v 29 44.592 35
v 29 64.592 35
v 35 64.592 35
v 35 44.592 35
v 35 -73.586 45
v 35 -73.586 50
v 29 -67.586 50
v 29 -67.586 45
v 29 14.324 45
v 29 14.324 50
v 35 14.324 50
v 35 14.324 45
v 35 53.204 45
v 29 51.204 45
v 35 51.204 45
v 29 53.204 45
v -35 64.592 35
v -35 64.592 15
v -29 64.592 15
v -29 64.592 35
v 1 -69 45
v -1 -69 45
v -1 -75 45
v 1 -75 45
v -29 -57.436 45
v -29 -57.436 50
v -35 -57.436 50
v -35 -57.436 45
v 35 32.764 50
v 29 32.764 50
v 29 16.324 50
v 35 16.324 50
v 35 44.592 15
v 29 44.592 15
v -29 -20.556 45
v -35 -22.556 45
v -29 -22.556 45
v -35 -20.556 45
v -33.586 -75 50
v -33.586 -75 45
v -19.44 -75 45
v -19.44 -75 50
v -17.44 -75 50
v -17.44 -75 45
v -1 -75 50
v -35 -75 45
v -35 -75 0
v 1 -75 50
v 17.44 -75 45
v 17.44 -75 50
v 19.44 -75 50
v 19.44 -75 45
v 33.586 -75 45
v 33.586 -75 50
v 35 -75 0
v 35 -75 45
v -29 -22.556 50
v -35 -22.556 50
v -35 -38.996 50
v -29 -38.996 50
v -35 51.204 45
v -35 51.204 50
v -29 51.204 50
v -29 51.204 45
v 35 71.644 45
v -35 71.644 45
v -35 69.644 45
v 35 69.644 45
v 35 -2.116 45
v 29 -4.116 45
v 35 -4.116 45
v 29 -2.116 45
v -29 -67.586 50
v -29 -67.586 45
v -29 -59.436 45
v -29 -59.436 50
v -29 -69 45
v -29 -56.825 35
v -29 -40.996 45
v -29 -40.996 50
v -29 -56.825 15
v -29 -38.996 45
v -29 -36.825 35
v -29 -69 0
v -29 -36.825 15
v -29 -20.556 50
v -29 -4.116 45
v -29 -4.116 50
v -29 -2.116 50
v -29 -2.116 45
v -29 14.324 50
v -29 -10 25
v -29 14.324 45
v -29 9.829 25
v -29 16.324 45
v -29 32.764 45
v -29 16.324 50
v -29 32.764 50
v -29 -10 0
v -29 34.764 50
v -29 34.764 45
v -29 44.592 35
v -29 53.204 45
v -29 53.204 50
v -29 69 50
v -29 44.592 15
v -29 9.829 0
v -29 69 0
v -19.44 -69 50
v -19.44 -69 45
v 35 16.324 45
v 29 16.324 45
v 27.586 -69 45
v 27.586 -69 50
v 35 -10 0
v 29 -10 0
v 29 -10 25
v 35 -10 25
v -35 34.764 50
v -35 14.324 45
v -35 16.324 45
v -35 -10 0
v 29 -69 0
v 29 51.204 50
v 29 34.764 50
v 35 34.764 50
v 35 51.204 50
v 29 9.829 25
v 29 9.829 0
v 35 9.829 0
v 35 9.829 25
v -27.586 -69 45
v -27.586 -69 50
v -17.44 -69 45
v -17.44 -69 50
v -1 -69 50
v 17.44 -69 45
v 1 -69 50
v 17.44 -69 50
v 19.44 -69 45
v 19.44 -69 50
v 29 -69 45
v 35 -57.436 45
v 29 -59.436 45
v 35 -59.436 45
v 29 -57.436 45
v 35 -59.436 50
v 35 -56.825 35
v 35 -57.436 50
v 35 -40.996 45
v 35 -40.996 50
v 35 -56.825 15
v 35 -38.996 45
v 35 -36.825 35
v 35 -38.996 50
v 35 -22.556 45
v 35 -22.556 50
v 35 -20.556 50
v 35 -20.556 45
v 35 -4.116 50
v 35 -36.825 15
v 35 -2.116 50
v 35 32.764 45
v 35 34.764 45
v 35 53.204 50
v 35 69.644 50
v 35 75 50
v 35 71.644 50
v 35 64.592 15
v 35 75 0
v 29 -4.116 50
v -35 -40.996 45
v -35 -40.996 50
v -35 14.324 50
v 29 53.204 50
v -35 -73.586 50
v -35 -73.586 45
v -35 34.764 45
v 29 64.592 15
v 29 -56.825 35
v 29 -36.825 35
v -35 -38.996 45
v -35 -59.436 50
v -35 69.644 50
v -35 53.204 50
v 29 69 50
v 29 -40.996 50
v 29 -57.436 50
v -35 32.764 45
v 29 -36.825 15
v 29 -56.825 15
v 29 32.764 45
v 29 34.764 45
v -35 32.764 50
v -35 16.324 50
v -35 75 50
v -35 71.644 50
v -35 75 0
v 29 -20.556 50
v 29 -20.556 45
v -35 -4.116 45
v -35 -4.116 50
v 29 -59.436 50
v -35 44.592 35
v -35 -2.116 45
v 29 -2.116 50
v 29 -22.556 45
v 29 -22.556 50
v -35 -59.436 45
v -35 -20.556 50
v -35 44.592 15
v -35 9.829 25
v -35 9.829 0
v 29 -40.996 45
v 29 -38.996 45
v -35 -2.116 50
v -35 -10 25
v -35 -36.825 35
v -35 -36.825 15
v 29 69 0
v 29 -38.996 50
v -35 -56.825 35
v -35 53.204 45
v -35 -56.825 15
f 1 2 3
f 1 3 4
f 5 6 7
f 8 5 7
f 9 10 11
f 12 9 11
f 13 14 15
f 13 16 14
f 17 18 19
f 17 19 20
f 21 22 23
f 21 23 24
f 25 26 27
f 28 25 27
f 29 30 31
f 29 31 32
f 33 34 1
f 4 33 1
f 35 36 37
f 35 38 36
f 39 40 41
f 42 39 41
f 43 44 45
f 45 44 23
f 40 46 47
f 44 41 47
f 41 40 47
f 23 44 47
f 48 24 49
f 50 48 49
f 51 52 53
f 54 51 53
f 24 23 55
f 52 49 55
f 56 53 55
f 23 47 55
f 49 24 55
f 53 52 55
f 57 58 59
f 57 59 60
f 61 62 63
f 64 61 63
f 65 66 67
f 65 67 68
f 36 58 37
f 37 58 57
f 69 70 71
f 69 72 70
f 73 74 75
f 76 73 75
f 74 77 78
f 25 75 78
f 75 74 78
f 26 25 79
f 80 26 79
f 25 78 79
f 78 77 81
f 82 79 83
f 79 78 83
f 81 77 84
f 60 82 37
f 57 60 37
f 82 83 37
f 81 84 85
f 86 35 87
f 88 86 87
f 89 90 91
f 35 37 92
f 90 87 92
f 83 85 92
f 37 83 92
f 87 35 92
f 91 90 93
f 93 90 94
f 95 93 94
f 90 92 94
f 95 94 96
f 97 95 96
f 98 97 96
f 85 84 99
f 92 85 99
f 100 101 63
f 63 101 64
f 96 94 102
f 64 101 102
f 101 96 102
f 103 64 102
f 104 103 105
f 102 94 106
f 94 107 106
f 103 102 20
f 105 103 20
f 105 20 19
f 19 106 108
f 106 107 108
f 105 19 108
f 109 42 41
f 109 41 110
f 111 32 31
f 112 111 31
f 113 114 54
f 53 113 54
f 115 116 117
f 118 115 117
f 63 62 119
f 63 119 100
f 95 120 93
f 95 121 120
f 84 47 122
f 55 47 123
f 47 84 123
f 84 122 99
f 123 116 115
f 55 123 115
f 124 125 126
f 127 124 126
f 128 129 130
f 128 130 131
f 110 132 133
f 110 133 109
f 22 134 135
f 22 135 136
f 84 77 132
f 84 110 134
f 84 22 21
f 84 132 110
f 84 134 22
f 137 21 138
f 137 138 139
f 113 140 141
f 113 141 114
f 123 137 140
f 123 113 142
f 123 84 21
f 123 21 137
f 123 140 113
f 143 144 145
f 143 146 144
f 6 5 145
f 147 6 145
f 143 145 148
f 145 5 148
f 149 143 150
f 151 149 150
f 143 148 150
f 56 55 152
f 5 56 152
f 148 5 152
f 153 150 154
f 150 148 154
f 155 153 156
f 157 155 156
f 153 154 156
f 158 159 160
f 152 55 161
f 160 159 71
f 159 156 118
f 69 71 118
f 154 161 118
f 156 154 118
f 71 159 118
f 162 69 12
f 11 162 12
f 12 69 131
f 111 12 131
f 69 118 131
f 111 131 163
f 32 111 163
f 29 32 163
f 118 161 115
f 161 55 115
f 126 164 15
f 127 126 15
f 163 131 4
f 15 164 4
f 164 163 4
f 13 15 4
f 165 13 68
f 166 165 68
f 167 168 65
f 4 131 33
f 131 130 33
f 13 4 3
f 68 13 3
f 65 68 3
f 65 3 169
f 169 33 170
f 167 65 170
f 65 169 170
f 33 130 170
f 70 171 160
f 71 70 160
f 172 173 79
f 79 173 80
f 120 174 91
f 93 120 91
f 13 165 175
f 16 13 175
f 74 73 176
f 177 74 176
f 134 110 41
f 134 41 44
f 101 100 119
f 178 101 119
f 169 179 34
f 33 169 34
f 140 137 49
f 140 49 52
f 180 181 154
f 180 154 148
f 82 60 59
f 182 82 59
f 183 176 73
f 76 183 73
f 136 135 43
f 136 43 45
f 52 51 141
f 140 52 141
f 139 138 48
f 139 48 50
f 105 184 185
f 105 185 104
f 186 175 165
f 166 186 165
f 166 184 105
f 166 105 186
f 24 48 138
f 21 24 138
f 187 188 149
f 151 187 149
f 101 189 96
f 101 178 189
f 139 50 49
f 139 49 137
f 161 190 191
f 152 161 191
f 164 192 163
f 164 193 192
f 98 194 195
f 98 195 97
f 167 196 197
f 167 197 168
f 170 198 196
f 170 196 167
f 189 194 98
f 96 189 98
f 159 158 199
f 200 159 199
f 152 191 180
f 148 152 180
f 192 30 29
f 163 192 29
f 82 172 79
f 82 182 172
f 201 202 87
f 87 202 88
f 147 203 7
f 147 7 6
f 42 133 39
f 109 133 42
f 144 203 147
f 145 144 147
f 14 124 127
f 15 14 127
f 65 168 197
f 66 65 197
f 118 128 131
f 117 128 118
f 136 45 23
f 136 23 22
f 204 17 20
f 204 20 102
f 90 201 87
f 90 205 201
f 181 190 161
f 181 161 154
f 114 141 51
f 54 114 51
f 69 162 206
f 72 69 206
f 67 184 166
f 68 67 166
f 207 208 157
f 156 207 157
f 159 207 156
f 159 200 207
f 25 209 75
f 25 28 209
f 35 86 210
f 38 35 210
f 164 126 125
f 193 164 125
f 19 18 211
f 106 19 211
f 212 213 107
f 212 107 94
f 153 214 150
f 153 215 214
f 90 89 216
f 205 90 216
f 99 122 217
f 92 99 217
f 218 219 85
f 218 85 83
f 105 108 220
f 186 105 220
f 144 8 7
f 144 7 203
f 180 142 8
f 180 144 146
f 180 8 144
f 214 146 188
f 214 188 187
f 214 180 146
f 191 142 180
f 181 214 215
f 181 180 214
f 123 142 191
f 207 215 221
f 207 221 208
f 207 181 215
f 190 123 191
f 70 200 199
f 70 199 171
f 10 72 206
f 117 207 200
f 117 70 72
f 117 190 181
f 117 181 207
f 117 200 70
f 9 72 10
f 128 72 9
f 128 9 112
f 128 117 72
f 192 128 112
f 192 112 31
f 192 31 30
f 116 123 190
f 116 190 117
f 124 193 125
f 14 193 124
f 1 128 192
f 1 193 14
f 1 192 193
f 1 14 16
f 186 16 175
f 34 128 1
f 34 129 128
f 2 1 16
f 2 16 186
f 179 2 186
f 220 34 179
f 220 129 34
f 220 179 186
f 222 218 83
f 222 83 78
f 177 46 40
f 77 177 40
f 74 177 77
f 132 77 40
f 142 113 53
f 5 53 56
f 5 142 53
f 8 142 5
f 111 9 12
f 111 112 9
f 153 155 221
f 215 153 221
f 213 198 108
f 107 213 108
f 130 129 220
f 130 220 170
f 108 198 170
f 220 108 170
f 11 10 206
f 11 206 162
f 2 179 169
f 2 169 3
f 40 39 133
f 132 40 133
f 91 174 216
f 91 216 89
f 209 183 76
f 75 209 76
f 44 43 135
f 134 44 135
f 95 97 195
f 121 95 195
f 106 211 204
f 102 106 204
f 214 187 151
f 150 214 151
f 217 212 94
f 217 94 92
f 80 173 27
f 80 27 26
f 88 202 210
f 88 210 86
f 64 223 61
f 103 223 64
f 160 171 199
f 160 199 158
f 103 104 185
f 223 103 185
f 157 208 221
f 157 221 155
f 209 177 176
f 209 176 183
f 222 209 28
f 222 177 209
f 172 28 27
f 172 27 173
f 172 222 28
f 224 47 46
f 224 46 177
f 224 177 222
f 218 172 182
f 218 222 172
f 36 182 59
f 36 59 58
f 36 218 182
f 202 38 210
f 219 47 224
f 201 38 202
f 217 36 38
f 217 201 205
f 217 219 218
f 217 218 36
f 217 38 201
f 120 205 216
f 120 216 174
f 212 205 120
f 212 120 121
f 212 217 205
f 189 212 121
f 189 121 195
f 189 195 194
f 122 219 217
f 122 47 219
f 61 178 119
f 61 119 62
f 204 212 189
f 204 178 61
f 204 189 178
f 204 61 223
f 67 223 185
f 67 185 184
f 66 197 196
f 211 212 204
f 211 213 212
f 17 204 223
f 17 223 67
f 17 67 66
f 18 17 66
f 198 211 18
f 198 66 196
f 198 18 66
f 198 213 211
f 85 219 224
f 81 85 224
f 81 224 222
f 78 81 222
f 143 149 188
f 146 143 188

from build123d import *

# Parameters (mm, degrees)
F0_W      = 70
F0_H      = 150
F0_W_2    = 58
F0_H_2    = 138
F1_DEPTH  = 50
F2_W      = 2
F2_H      = 6
F3_DEPTH  = 5
F4_W      = 2
F4_H      = 6
F5_DEPTH  = 5
F7_DEPTH  = 5
F8_W      = 20
F8_H      = 20
F8_W_2    = 19.828947
F8_H_2    = 25
F9_DEPTH  = 200
F10_DEPTH = 25


with BuildPart() as f1:
    # F0 (on Top) → F1 (new body)
    with BuildSketch(Plane.XY):
        Rectangle(F0_W, F0_H)
        Rectangle(F0_W_2, F0_H_2, mode=Mode.SUBTRACT)
    extrude(amount=F1_DEPTH)

    # F2 (on face) → F3 (cut)
    with BuildSketch(Plane.XY.offset(50)):
        with Locations((0, -72)):
            Rectangle(F2_W, F2_H)
        Polygon((-34.292893, -75.707107), (-28.292893, -69.707107), (-27.585786, -69), (-29, -67.585786), (-29.707107, -68.292893), (-35.707107, -74.292893), align=None)
        Polygon((27.585786, -69), (28.292893, -69.707107), (33.585786, -75), (35, -75), (35, -73.585786), (29.707107, -68.292893), (29, -67.585786), align=None)
    extrude(amount=-F3_DEPTH, mode=Mode.SUBTRACT)

    # F4 (on face) → F5 (cut)
    with BuildSketch(Plane.XY.offset(50)):
        with Locations((-18.44, -72)):
            Rectangle(F4_W, F4_H)
        with Locations((18.44, -72)):
            Rectangle(F4_W, F4_H)
    extrude(amount=-F5_DEPTH, mode=Mode.SUBTRACT)

    # F6 (on face) → F7 (cut)
    with BuildSketch(Plane.XY.offset(50)):
        Polygon((29, -59.435786), (35, -59.435786), (35, -57.435786), (29, -57.435786), (-66.520862, -57.435786), (-66.520862, -59.435786), align=None)
        Polygon((35, -40.995786), (35, -38.995786), (29, -38.995786), (-40.70507, -38.995786), (-40.70507, -40.995786), (29, -40.995786), align=None)
        Polygon((35, -22.555786), (35, -20.555786), (29, -20.555786), (-41.178755, -20.555786), (-41.178755, -22.555786), (29, -22.555786), align=None)
        Polygon((35, -4.115786), (35, -2.115786), (29, -2.115786), (-41.403655, -2.115786), (-41.403655, -4.115786), (29, -4.115786), align=None)
        Polygon((35, 14.324214), (35, 16.324214), (29, 16.324214), (-43.992728, 16.324214), (-43.992728, 14.324214), (29, 14.324214), align=None)
        Polygon((35, 32.764214), (35, 34.764214), (29, 34.764214), (-43.992728, 34.764214), (-43.992728, 32.764214), (29, 32.764214), align=None)
        Polygon((35, 51.204214), (35, 53.204214), (29, 53.204214), (-39.611217, 53.204214), (-39.611217, 51.204214), (29, 51.204214), align=None)
        Polygon((29, 69.644214), (35, 69.644214), (35, 71.644214), (29, 71.644214), (-35, 71.644214), (-35, 69.644214), align=None)
    extrude(amount=-F7_DEPTH, mode=Mode.SUBTRACT)

    # F8 (on face) → F9 (cut)
    with BuildSketch(Plane(origin=(-35, 0, 0), x_dir=(0, -1, 0), z_dir=(-1, 0, 0))):
        with Locations((-54.592106, 25)):
            Rectangle(F8_W, F8_H)
        with Locations((46.825401, 25)):
            Rectangle(F8_W, F8_H)
        with Locations((0.085527, 12.5)):
            Rectangle(F8_W_2, F8_H_2)
    extrude(amount=-F9_DEPTH, mode=Mode.SUBTRACT)

    # F8 (on face) → F10 (cut)
    with BuildSketch(Plane(origin=(-35, 0, 0), x_dir=(0, -1, 0), z_dir=(-1, 0, 0))):
        with Locations((-54.592106, 25)):
            Rectangle(F8_W, F8_H)
        with Locations((46.825401, 25)):
            Rectangle(F8_W, F8_H)
        with Locations((0.085527, 12.5)):
            Rectangle(F8_W_2, F8_H_2)
    extrude(amount=-F10_DEPTH, mode=Mode.SUBTRACT)


solid = f1.part
